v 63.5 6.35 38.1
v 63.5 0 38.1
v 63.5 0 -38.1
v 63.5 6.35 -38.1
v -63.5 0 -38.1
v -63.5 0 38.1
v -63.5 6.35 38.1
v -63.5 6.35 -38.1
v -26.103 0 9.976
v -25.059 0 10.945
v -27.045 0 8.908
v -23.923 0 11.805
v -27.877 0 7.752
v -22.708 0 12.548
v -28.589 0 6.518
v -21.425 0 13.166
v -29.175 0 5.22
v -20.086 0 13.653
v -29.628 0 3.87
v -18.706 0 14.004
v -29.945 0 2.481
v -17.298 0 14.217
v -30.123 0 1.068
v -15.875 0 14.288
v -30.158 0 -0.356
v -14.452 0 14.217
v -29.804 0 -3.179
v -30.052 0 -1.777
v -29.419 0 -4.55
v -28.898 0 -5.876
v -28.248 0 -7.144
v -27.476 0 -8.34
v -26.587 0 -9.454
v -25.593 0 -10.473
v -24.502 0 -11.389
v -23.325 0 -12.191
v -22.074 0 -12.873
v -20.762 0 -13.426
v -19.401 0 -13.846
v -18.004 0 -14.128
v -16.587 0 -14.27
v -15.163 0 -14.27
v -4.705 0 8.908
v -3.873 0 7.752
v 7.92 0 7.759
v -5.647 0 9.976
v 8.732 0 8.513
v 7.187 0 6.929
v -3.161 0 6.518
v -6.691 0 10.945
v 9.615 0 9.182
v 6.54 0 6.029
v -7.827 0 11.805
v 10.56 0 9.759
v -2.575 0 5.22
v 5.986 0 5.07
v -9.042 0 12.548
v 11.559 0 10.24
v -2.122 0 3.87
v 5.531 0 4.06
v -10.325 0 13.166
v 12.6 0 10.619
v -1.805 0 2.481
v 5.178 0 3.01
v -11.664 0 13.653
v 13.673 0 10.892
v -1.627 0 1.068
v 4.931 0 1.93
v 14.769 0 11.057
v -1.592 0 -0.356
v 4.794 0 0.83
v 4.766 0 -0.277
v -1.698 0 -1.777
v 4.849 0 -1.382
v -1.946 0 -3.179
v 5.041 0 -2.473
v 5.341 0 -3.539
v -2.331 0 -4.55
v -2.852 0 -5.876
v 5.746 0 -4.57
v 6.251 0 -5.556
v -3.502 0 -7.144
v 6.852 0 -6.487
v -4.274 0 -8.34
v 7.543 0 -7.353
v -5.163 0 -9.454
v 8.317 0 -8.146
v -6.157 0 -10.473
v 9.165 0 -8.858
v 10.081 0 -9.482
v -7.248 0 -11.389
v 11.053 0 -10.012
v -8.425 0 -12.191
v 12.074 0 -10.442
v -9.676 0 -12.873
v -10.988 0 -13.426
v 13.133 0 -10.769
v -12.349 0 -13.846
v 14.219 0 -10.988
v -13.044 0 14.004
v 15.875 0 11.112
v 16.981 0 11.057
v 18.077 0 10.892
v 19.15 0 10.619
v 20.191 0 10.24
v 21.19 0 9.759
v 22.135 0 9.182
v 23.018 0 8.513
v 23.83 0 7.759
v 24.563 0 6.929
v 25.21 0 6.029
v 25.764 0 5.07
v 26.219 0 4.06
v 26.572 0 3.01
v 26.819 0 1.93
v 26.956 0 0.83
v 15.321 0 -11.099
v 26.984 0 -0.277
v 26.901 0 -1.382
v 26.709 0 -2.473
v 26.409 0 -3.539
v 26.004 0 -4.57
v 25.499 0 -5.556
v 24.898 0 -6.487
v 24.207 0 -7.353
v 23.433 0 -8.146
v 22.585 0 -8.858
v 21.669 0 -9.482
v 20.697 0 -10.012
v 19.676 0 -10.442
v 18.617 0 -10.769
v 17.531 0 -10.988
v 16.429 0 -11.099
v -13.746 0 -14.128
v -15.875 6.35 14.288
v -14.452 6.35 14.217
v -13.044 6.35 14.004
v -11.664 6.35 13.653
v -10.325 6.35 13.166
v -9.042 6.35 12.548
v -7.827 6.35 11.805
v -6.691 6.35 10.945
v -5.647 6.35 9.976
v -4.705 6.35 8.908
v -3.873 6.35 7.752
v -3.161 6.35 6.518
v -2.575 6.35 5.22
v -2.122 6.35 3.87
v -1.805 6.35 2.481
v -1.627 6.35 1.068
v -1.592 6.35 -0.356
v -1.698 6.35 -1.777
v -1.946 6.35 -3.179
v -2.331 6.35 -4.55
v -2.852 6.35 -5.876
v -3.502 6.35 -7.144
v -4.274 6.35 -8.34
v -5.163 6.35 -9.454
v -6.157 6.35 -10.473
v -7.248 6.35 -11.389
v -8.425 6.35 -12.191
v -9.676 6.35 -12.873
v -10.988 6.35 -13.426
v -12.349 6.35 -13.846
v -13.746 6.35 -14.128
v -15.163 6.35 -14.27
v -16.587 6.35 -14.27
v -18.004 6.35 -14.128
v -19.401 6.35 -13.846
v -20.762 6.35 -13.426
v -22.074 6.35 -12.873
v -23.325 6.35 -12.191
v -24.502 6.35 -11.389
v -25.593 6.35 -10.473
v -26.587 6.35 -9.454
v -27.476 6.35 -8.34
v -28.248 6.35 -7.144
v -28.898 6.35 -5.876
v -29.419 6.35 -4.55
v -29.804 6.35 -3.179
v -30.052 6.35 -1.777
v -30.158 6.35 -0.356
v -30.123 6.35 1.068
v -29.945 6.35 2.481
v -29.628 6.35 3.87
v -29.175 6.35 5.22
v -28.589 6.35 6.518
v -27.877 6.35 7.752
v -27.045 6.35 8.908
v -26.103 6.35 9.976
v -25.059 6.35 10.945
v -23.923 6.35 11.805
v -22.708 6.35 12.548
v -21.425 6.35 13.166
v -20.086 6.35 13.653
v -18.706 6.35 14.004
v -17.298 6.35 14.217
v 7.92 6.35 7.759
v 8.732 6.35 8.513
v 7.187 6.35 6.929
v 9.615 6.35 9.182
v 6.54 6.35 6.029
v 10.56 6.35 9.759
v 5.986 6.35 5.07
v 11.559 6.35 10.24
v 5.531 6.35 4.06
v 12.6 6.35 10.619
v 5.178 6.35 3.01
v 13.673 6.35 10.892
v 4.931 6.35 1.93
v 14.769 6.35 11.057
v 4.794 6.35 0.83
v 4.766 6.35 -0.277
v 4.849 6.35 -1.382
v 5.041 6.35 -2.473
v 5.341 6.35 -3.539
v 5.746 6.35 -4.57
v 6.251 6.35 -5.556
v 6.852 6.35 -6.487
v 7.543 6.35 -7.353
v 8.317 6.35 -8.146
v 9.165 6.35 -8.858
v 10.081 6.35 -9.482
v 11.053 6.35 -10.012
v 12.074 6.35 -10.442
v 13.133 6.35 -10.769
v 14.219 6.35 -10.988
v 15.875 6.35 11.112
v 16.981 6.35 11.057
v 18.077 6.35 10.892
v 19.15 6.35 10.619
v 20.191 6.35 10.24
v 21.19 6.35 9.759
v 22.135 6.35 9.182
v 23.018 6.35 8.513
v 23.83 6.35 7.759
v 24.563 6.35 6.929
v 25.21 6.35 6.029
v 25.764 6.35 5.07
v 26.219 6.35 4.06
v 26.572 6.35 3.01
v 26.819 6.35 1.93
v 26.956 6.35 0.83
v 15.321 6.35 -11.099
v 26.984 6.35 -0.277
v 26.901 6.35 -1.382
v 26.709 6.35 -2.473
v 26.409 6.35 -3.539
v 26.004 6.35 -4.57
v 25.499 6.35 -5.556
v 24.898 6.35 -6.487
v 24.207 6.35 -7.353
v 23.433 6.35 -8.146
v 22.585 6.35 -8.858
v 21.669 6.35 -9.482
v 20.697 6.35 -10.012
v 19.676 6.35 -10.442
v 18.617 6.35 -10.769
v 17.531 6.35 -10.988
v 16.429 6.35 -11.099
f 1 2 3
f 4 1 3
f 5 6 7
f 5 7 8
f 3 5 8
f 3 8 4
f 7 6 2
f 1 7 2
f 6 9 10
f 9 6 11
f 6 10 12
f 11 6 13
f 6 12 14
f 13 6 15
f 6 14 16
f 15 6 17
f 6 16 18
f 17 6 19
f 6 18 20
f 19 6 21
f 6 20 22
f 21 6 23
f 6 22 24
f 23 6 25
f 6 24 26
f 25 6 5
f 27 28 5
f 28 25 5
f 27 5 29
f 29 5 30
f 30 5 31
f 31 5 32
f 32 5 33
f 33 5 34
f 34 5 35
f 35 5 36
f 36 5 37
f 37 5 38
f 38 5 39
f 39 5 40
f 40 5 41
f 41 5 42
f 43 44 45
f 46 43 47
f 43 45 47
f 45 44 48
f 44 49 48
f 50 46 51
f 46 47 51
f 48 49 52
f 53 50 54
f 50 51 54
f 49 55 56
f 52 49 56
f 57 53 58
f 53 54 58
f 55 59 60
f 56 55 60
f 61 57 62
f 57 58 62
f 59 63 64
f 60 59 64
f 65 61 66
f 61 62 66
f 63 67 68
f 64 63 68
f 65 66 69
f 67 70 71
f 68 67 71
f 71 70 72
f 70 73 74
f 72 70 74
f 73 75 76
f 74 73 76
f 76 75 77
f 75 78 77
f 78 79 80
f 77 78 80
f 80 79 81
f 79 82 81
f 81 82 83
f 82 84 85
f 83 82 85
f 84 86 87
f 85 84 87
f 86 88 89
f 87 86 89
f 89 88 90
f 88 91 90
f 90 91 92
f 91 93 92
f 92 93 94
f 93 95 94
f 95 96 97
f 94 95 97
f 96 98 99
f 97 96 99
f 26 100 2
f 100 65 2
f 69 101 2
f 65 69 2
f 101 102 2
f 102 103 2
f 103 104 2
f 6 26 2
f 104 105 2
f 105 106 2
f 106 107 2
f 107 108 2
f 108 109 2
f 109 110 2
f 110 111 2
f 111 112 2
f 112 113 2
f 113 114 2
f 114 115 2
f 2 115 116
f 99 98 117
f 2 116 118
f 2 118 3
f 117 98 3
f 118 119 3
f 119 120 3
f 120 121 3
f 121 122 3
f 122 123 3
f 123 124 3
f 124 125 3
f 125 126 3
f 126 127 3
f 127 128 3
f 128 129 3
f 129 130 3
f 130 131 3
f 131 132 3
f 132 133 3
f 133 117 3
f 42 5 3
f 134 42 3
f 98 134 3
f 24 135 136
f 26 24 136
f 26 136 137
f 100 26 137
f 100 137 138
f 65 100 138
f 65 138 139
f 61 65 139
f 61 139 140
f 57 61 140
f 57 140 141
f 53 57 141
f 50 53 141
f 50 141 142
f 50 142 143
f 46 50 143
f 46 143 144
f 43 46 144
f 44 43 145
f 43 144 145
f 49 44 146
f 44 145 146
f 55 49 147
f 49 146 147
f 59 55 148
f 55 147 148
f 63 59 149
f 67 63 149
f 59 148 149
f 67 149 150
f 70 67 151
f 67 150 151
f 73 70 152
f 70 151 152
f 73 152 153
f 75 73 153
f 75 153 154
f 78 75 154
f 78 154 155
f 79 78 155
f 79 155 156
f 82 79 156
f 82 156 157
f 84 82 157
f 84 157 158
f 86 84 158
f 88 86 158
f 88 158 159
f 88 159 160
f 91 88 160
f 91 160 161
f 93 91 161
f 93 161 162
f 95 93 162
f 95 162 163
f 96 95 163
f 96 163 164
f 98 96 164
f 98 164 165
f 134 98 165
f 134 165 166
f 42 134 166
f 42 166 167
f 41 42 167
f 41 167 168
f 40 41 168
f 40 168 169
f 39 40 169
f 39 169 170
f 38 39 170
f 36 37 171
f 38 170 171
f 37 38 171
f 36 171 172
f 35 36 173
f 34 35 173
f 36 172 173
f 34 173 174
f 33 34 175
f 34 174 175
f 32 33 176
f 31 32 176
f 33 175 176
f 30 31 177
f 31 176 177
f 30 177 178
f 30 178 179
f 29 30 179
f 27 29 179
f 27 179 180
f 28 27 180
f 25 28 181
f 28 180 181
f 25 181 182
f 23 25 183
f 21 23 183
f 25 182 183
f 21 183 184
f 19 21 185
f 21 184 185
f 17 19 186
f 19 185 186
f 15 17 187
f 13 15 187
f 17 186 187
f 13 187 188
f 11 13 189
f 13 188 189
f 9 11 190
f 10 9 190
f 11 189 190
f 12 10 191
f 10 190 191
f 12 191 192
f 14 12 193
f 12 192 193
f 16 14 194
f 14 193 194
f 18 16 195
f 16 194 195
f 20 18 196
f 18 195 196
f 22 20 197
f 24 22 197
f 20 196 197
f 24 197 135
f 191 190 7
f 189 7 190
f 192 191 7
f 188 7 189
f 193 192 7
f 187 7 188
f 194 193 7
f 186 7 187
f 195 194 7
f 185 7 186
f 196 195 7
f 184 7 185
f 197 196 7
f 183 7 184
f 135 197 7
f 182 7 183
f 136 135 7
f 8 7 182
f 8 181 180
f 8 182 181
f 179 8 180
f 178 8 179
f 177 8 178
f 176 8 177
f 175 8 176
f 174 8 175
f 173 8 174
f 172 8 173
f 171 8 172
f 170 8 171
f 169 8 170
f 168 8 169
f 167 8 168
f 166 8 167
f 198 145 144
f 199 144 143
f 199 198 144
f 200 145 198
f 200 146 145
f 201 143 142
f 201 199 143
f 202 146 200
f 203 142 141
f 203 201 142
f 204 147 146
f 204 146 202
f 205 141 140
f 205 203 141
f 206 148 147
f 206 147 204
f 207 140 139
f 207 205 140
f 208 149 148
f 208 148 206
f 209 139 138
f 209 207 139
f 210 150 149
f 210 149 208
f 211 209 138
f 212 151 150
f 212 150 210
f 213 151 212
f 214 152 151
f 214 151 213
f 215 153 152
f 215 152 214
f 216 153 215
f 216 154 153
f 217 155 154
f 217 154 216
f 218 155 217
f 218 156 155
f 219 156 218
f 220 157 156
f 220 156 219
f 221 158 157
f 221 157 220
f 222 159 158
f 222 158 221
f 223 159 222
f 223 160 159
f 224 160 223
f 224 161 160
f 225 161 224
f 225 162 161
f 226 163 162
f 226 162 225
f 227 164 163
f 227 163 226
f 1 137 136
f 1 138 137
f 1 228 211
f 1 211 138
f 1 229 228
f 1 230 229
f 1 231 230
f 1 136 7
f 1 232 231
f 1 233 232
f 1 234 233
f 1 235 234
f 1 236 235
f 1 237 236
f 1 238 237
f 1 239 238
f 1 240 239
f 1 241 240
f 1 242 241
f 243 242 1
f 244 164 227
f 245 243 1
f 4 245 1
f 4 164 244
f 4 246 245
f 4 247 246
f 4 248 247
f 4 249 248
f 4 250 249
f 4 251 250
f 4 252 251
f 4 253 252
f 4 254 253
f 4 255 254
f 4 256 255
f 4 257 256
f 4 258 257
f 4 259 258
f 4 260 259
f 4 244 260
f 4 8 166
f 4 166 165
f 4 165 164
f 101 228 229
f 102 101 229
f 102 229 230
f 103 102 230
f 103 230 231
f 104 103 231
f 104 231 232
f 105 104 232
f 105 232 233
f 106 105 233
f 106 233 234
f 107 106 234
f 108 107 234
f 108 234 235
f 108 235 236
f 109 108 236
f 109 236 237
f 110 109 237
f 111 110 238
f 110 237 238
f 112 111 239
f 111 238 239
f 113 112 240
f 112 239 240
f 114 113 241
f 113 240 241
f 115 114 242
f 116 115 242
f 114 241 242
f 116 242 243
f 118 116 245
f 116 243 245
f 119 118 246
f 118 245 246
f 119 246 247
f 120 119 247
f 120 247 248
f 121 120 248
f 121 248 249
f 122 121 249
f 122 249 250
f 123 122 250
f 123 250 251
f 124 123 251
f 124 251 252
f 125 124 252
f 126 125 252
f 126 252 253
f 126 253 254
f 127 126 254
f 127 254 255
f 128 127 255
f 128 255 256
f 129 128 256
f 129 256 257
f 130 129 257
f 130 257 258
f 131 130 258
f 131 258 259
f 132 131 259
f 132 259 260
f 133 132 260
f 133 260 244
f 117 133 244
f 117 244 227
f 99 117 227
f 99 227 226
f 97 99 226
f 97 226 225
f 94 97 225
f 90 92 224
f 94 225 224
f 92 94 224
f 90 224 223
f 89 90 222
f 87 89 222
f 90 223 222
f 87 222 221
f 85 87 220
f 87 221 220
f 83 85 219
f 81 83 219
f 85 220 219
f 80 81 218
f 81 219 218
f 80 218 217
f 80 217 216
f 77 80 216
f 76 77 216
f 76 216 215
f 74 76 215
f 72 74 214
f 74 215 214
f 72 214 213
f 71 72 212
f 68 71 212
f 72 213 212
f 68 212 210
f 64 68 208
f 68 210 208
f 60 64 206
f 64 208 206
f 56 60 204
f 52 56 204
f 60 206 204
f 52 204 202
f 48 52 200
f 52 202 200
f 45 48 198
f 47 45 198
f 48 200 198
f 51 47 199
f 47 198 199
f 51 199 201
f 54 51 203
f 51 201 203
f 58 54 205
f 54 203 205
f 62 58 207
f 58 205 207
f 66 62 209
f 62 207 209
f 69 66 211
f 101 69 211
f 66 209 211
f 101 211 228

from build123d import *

# Parameters (mm, degrees)
SKETCH1_W           = 127
SKETCH1_H           = 76.2
BOSS_EXTRUDE1_DEPTH = 6.35
SKETCH3_R           = 14.2875
CUT_EXTRUDE1_DEPTH  = 75.324844433
SKETCH4_R           = 11.1125
CUT_EXTRUDE2_DEPTH  = 75.324844433


with BuildPart() as part:
    # Sketch1 → Boss-Extrude1 (new body)
    with BuildSketch(Plane(origin=(0, 0, 0), x_dir=(1, 0, 0), z_dir=(0, 1, 0))):
        Rectangle(SKETCH1_W, SKETCH1_H)
    extrude(amount=BOSS_EXTRUDE1_DEPTH)

    # Sketch3 → Cut-Extrude1 (cut, through all)
    with BuildSketch(Plane(origin=(0, 6.35, 0), x_dir=(1, 0, 0), z_dir=(0, 1, 0))):
        with Locations(Location((-15.875, 0, 0), (0, 0, 270))):
            Circle(SKETCH3_R)
    extrude(amount=-CUT_EXTRUDE1_DEPTH, mode=Mode.SUBTRACT)

    # Sketch4 → Cut-Extrude2 (cut, through all)
    with BuildSketch(Plane(origin=(0, 6.35, 0), x_dir=(1, 0, 0), z_dir=(0, 1, 0))):
        with Locations(Location((15.875, 0, 0), (0, 0, 270))):
            Circle(SKETCH4_R)
    extrude(amount=-CUT_EXTRUDE2_DEPTH, mode=Mode.SUBTRACT)


solid = part.part
